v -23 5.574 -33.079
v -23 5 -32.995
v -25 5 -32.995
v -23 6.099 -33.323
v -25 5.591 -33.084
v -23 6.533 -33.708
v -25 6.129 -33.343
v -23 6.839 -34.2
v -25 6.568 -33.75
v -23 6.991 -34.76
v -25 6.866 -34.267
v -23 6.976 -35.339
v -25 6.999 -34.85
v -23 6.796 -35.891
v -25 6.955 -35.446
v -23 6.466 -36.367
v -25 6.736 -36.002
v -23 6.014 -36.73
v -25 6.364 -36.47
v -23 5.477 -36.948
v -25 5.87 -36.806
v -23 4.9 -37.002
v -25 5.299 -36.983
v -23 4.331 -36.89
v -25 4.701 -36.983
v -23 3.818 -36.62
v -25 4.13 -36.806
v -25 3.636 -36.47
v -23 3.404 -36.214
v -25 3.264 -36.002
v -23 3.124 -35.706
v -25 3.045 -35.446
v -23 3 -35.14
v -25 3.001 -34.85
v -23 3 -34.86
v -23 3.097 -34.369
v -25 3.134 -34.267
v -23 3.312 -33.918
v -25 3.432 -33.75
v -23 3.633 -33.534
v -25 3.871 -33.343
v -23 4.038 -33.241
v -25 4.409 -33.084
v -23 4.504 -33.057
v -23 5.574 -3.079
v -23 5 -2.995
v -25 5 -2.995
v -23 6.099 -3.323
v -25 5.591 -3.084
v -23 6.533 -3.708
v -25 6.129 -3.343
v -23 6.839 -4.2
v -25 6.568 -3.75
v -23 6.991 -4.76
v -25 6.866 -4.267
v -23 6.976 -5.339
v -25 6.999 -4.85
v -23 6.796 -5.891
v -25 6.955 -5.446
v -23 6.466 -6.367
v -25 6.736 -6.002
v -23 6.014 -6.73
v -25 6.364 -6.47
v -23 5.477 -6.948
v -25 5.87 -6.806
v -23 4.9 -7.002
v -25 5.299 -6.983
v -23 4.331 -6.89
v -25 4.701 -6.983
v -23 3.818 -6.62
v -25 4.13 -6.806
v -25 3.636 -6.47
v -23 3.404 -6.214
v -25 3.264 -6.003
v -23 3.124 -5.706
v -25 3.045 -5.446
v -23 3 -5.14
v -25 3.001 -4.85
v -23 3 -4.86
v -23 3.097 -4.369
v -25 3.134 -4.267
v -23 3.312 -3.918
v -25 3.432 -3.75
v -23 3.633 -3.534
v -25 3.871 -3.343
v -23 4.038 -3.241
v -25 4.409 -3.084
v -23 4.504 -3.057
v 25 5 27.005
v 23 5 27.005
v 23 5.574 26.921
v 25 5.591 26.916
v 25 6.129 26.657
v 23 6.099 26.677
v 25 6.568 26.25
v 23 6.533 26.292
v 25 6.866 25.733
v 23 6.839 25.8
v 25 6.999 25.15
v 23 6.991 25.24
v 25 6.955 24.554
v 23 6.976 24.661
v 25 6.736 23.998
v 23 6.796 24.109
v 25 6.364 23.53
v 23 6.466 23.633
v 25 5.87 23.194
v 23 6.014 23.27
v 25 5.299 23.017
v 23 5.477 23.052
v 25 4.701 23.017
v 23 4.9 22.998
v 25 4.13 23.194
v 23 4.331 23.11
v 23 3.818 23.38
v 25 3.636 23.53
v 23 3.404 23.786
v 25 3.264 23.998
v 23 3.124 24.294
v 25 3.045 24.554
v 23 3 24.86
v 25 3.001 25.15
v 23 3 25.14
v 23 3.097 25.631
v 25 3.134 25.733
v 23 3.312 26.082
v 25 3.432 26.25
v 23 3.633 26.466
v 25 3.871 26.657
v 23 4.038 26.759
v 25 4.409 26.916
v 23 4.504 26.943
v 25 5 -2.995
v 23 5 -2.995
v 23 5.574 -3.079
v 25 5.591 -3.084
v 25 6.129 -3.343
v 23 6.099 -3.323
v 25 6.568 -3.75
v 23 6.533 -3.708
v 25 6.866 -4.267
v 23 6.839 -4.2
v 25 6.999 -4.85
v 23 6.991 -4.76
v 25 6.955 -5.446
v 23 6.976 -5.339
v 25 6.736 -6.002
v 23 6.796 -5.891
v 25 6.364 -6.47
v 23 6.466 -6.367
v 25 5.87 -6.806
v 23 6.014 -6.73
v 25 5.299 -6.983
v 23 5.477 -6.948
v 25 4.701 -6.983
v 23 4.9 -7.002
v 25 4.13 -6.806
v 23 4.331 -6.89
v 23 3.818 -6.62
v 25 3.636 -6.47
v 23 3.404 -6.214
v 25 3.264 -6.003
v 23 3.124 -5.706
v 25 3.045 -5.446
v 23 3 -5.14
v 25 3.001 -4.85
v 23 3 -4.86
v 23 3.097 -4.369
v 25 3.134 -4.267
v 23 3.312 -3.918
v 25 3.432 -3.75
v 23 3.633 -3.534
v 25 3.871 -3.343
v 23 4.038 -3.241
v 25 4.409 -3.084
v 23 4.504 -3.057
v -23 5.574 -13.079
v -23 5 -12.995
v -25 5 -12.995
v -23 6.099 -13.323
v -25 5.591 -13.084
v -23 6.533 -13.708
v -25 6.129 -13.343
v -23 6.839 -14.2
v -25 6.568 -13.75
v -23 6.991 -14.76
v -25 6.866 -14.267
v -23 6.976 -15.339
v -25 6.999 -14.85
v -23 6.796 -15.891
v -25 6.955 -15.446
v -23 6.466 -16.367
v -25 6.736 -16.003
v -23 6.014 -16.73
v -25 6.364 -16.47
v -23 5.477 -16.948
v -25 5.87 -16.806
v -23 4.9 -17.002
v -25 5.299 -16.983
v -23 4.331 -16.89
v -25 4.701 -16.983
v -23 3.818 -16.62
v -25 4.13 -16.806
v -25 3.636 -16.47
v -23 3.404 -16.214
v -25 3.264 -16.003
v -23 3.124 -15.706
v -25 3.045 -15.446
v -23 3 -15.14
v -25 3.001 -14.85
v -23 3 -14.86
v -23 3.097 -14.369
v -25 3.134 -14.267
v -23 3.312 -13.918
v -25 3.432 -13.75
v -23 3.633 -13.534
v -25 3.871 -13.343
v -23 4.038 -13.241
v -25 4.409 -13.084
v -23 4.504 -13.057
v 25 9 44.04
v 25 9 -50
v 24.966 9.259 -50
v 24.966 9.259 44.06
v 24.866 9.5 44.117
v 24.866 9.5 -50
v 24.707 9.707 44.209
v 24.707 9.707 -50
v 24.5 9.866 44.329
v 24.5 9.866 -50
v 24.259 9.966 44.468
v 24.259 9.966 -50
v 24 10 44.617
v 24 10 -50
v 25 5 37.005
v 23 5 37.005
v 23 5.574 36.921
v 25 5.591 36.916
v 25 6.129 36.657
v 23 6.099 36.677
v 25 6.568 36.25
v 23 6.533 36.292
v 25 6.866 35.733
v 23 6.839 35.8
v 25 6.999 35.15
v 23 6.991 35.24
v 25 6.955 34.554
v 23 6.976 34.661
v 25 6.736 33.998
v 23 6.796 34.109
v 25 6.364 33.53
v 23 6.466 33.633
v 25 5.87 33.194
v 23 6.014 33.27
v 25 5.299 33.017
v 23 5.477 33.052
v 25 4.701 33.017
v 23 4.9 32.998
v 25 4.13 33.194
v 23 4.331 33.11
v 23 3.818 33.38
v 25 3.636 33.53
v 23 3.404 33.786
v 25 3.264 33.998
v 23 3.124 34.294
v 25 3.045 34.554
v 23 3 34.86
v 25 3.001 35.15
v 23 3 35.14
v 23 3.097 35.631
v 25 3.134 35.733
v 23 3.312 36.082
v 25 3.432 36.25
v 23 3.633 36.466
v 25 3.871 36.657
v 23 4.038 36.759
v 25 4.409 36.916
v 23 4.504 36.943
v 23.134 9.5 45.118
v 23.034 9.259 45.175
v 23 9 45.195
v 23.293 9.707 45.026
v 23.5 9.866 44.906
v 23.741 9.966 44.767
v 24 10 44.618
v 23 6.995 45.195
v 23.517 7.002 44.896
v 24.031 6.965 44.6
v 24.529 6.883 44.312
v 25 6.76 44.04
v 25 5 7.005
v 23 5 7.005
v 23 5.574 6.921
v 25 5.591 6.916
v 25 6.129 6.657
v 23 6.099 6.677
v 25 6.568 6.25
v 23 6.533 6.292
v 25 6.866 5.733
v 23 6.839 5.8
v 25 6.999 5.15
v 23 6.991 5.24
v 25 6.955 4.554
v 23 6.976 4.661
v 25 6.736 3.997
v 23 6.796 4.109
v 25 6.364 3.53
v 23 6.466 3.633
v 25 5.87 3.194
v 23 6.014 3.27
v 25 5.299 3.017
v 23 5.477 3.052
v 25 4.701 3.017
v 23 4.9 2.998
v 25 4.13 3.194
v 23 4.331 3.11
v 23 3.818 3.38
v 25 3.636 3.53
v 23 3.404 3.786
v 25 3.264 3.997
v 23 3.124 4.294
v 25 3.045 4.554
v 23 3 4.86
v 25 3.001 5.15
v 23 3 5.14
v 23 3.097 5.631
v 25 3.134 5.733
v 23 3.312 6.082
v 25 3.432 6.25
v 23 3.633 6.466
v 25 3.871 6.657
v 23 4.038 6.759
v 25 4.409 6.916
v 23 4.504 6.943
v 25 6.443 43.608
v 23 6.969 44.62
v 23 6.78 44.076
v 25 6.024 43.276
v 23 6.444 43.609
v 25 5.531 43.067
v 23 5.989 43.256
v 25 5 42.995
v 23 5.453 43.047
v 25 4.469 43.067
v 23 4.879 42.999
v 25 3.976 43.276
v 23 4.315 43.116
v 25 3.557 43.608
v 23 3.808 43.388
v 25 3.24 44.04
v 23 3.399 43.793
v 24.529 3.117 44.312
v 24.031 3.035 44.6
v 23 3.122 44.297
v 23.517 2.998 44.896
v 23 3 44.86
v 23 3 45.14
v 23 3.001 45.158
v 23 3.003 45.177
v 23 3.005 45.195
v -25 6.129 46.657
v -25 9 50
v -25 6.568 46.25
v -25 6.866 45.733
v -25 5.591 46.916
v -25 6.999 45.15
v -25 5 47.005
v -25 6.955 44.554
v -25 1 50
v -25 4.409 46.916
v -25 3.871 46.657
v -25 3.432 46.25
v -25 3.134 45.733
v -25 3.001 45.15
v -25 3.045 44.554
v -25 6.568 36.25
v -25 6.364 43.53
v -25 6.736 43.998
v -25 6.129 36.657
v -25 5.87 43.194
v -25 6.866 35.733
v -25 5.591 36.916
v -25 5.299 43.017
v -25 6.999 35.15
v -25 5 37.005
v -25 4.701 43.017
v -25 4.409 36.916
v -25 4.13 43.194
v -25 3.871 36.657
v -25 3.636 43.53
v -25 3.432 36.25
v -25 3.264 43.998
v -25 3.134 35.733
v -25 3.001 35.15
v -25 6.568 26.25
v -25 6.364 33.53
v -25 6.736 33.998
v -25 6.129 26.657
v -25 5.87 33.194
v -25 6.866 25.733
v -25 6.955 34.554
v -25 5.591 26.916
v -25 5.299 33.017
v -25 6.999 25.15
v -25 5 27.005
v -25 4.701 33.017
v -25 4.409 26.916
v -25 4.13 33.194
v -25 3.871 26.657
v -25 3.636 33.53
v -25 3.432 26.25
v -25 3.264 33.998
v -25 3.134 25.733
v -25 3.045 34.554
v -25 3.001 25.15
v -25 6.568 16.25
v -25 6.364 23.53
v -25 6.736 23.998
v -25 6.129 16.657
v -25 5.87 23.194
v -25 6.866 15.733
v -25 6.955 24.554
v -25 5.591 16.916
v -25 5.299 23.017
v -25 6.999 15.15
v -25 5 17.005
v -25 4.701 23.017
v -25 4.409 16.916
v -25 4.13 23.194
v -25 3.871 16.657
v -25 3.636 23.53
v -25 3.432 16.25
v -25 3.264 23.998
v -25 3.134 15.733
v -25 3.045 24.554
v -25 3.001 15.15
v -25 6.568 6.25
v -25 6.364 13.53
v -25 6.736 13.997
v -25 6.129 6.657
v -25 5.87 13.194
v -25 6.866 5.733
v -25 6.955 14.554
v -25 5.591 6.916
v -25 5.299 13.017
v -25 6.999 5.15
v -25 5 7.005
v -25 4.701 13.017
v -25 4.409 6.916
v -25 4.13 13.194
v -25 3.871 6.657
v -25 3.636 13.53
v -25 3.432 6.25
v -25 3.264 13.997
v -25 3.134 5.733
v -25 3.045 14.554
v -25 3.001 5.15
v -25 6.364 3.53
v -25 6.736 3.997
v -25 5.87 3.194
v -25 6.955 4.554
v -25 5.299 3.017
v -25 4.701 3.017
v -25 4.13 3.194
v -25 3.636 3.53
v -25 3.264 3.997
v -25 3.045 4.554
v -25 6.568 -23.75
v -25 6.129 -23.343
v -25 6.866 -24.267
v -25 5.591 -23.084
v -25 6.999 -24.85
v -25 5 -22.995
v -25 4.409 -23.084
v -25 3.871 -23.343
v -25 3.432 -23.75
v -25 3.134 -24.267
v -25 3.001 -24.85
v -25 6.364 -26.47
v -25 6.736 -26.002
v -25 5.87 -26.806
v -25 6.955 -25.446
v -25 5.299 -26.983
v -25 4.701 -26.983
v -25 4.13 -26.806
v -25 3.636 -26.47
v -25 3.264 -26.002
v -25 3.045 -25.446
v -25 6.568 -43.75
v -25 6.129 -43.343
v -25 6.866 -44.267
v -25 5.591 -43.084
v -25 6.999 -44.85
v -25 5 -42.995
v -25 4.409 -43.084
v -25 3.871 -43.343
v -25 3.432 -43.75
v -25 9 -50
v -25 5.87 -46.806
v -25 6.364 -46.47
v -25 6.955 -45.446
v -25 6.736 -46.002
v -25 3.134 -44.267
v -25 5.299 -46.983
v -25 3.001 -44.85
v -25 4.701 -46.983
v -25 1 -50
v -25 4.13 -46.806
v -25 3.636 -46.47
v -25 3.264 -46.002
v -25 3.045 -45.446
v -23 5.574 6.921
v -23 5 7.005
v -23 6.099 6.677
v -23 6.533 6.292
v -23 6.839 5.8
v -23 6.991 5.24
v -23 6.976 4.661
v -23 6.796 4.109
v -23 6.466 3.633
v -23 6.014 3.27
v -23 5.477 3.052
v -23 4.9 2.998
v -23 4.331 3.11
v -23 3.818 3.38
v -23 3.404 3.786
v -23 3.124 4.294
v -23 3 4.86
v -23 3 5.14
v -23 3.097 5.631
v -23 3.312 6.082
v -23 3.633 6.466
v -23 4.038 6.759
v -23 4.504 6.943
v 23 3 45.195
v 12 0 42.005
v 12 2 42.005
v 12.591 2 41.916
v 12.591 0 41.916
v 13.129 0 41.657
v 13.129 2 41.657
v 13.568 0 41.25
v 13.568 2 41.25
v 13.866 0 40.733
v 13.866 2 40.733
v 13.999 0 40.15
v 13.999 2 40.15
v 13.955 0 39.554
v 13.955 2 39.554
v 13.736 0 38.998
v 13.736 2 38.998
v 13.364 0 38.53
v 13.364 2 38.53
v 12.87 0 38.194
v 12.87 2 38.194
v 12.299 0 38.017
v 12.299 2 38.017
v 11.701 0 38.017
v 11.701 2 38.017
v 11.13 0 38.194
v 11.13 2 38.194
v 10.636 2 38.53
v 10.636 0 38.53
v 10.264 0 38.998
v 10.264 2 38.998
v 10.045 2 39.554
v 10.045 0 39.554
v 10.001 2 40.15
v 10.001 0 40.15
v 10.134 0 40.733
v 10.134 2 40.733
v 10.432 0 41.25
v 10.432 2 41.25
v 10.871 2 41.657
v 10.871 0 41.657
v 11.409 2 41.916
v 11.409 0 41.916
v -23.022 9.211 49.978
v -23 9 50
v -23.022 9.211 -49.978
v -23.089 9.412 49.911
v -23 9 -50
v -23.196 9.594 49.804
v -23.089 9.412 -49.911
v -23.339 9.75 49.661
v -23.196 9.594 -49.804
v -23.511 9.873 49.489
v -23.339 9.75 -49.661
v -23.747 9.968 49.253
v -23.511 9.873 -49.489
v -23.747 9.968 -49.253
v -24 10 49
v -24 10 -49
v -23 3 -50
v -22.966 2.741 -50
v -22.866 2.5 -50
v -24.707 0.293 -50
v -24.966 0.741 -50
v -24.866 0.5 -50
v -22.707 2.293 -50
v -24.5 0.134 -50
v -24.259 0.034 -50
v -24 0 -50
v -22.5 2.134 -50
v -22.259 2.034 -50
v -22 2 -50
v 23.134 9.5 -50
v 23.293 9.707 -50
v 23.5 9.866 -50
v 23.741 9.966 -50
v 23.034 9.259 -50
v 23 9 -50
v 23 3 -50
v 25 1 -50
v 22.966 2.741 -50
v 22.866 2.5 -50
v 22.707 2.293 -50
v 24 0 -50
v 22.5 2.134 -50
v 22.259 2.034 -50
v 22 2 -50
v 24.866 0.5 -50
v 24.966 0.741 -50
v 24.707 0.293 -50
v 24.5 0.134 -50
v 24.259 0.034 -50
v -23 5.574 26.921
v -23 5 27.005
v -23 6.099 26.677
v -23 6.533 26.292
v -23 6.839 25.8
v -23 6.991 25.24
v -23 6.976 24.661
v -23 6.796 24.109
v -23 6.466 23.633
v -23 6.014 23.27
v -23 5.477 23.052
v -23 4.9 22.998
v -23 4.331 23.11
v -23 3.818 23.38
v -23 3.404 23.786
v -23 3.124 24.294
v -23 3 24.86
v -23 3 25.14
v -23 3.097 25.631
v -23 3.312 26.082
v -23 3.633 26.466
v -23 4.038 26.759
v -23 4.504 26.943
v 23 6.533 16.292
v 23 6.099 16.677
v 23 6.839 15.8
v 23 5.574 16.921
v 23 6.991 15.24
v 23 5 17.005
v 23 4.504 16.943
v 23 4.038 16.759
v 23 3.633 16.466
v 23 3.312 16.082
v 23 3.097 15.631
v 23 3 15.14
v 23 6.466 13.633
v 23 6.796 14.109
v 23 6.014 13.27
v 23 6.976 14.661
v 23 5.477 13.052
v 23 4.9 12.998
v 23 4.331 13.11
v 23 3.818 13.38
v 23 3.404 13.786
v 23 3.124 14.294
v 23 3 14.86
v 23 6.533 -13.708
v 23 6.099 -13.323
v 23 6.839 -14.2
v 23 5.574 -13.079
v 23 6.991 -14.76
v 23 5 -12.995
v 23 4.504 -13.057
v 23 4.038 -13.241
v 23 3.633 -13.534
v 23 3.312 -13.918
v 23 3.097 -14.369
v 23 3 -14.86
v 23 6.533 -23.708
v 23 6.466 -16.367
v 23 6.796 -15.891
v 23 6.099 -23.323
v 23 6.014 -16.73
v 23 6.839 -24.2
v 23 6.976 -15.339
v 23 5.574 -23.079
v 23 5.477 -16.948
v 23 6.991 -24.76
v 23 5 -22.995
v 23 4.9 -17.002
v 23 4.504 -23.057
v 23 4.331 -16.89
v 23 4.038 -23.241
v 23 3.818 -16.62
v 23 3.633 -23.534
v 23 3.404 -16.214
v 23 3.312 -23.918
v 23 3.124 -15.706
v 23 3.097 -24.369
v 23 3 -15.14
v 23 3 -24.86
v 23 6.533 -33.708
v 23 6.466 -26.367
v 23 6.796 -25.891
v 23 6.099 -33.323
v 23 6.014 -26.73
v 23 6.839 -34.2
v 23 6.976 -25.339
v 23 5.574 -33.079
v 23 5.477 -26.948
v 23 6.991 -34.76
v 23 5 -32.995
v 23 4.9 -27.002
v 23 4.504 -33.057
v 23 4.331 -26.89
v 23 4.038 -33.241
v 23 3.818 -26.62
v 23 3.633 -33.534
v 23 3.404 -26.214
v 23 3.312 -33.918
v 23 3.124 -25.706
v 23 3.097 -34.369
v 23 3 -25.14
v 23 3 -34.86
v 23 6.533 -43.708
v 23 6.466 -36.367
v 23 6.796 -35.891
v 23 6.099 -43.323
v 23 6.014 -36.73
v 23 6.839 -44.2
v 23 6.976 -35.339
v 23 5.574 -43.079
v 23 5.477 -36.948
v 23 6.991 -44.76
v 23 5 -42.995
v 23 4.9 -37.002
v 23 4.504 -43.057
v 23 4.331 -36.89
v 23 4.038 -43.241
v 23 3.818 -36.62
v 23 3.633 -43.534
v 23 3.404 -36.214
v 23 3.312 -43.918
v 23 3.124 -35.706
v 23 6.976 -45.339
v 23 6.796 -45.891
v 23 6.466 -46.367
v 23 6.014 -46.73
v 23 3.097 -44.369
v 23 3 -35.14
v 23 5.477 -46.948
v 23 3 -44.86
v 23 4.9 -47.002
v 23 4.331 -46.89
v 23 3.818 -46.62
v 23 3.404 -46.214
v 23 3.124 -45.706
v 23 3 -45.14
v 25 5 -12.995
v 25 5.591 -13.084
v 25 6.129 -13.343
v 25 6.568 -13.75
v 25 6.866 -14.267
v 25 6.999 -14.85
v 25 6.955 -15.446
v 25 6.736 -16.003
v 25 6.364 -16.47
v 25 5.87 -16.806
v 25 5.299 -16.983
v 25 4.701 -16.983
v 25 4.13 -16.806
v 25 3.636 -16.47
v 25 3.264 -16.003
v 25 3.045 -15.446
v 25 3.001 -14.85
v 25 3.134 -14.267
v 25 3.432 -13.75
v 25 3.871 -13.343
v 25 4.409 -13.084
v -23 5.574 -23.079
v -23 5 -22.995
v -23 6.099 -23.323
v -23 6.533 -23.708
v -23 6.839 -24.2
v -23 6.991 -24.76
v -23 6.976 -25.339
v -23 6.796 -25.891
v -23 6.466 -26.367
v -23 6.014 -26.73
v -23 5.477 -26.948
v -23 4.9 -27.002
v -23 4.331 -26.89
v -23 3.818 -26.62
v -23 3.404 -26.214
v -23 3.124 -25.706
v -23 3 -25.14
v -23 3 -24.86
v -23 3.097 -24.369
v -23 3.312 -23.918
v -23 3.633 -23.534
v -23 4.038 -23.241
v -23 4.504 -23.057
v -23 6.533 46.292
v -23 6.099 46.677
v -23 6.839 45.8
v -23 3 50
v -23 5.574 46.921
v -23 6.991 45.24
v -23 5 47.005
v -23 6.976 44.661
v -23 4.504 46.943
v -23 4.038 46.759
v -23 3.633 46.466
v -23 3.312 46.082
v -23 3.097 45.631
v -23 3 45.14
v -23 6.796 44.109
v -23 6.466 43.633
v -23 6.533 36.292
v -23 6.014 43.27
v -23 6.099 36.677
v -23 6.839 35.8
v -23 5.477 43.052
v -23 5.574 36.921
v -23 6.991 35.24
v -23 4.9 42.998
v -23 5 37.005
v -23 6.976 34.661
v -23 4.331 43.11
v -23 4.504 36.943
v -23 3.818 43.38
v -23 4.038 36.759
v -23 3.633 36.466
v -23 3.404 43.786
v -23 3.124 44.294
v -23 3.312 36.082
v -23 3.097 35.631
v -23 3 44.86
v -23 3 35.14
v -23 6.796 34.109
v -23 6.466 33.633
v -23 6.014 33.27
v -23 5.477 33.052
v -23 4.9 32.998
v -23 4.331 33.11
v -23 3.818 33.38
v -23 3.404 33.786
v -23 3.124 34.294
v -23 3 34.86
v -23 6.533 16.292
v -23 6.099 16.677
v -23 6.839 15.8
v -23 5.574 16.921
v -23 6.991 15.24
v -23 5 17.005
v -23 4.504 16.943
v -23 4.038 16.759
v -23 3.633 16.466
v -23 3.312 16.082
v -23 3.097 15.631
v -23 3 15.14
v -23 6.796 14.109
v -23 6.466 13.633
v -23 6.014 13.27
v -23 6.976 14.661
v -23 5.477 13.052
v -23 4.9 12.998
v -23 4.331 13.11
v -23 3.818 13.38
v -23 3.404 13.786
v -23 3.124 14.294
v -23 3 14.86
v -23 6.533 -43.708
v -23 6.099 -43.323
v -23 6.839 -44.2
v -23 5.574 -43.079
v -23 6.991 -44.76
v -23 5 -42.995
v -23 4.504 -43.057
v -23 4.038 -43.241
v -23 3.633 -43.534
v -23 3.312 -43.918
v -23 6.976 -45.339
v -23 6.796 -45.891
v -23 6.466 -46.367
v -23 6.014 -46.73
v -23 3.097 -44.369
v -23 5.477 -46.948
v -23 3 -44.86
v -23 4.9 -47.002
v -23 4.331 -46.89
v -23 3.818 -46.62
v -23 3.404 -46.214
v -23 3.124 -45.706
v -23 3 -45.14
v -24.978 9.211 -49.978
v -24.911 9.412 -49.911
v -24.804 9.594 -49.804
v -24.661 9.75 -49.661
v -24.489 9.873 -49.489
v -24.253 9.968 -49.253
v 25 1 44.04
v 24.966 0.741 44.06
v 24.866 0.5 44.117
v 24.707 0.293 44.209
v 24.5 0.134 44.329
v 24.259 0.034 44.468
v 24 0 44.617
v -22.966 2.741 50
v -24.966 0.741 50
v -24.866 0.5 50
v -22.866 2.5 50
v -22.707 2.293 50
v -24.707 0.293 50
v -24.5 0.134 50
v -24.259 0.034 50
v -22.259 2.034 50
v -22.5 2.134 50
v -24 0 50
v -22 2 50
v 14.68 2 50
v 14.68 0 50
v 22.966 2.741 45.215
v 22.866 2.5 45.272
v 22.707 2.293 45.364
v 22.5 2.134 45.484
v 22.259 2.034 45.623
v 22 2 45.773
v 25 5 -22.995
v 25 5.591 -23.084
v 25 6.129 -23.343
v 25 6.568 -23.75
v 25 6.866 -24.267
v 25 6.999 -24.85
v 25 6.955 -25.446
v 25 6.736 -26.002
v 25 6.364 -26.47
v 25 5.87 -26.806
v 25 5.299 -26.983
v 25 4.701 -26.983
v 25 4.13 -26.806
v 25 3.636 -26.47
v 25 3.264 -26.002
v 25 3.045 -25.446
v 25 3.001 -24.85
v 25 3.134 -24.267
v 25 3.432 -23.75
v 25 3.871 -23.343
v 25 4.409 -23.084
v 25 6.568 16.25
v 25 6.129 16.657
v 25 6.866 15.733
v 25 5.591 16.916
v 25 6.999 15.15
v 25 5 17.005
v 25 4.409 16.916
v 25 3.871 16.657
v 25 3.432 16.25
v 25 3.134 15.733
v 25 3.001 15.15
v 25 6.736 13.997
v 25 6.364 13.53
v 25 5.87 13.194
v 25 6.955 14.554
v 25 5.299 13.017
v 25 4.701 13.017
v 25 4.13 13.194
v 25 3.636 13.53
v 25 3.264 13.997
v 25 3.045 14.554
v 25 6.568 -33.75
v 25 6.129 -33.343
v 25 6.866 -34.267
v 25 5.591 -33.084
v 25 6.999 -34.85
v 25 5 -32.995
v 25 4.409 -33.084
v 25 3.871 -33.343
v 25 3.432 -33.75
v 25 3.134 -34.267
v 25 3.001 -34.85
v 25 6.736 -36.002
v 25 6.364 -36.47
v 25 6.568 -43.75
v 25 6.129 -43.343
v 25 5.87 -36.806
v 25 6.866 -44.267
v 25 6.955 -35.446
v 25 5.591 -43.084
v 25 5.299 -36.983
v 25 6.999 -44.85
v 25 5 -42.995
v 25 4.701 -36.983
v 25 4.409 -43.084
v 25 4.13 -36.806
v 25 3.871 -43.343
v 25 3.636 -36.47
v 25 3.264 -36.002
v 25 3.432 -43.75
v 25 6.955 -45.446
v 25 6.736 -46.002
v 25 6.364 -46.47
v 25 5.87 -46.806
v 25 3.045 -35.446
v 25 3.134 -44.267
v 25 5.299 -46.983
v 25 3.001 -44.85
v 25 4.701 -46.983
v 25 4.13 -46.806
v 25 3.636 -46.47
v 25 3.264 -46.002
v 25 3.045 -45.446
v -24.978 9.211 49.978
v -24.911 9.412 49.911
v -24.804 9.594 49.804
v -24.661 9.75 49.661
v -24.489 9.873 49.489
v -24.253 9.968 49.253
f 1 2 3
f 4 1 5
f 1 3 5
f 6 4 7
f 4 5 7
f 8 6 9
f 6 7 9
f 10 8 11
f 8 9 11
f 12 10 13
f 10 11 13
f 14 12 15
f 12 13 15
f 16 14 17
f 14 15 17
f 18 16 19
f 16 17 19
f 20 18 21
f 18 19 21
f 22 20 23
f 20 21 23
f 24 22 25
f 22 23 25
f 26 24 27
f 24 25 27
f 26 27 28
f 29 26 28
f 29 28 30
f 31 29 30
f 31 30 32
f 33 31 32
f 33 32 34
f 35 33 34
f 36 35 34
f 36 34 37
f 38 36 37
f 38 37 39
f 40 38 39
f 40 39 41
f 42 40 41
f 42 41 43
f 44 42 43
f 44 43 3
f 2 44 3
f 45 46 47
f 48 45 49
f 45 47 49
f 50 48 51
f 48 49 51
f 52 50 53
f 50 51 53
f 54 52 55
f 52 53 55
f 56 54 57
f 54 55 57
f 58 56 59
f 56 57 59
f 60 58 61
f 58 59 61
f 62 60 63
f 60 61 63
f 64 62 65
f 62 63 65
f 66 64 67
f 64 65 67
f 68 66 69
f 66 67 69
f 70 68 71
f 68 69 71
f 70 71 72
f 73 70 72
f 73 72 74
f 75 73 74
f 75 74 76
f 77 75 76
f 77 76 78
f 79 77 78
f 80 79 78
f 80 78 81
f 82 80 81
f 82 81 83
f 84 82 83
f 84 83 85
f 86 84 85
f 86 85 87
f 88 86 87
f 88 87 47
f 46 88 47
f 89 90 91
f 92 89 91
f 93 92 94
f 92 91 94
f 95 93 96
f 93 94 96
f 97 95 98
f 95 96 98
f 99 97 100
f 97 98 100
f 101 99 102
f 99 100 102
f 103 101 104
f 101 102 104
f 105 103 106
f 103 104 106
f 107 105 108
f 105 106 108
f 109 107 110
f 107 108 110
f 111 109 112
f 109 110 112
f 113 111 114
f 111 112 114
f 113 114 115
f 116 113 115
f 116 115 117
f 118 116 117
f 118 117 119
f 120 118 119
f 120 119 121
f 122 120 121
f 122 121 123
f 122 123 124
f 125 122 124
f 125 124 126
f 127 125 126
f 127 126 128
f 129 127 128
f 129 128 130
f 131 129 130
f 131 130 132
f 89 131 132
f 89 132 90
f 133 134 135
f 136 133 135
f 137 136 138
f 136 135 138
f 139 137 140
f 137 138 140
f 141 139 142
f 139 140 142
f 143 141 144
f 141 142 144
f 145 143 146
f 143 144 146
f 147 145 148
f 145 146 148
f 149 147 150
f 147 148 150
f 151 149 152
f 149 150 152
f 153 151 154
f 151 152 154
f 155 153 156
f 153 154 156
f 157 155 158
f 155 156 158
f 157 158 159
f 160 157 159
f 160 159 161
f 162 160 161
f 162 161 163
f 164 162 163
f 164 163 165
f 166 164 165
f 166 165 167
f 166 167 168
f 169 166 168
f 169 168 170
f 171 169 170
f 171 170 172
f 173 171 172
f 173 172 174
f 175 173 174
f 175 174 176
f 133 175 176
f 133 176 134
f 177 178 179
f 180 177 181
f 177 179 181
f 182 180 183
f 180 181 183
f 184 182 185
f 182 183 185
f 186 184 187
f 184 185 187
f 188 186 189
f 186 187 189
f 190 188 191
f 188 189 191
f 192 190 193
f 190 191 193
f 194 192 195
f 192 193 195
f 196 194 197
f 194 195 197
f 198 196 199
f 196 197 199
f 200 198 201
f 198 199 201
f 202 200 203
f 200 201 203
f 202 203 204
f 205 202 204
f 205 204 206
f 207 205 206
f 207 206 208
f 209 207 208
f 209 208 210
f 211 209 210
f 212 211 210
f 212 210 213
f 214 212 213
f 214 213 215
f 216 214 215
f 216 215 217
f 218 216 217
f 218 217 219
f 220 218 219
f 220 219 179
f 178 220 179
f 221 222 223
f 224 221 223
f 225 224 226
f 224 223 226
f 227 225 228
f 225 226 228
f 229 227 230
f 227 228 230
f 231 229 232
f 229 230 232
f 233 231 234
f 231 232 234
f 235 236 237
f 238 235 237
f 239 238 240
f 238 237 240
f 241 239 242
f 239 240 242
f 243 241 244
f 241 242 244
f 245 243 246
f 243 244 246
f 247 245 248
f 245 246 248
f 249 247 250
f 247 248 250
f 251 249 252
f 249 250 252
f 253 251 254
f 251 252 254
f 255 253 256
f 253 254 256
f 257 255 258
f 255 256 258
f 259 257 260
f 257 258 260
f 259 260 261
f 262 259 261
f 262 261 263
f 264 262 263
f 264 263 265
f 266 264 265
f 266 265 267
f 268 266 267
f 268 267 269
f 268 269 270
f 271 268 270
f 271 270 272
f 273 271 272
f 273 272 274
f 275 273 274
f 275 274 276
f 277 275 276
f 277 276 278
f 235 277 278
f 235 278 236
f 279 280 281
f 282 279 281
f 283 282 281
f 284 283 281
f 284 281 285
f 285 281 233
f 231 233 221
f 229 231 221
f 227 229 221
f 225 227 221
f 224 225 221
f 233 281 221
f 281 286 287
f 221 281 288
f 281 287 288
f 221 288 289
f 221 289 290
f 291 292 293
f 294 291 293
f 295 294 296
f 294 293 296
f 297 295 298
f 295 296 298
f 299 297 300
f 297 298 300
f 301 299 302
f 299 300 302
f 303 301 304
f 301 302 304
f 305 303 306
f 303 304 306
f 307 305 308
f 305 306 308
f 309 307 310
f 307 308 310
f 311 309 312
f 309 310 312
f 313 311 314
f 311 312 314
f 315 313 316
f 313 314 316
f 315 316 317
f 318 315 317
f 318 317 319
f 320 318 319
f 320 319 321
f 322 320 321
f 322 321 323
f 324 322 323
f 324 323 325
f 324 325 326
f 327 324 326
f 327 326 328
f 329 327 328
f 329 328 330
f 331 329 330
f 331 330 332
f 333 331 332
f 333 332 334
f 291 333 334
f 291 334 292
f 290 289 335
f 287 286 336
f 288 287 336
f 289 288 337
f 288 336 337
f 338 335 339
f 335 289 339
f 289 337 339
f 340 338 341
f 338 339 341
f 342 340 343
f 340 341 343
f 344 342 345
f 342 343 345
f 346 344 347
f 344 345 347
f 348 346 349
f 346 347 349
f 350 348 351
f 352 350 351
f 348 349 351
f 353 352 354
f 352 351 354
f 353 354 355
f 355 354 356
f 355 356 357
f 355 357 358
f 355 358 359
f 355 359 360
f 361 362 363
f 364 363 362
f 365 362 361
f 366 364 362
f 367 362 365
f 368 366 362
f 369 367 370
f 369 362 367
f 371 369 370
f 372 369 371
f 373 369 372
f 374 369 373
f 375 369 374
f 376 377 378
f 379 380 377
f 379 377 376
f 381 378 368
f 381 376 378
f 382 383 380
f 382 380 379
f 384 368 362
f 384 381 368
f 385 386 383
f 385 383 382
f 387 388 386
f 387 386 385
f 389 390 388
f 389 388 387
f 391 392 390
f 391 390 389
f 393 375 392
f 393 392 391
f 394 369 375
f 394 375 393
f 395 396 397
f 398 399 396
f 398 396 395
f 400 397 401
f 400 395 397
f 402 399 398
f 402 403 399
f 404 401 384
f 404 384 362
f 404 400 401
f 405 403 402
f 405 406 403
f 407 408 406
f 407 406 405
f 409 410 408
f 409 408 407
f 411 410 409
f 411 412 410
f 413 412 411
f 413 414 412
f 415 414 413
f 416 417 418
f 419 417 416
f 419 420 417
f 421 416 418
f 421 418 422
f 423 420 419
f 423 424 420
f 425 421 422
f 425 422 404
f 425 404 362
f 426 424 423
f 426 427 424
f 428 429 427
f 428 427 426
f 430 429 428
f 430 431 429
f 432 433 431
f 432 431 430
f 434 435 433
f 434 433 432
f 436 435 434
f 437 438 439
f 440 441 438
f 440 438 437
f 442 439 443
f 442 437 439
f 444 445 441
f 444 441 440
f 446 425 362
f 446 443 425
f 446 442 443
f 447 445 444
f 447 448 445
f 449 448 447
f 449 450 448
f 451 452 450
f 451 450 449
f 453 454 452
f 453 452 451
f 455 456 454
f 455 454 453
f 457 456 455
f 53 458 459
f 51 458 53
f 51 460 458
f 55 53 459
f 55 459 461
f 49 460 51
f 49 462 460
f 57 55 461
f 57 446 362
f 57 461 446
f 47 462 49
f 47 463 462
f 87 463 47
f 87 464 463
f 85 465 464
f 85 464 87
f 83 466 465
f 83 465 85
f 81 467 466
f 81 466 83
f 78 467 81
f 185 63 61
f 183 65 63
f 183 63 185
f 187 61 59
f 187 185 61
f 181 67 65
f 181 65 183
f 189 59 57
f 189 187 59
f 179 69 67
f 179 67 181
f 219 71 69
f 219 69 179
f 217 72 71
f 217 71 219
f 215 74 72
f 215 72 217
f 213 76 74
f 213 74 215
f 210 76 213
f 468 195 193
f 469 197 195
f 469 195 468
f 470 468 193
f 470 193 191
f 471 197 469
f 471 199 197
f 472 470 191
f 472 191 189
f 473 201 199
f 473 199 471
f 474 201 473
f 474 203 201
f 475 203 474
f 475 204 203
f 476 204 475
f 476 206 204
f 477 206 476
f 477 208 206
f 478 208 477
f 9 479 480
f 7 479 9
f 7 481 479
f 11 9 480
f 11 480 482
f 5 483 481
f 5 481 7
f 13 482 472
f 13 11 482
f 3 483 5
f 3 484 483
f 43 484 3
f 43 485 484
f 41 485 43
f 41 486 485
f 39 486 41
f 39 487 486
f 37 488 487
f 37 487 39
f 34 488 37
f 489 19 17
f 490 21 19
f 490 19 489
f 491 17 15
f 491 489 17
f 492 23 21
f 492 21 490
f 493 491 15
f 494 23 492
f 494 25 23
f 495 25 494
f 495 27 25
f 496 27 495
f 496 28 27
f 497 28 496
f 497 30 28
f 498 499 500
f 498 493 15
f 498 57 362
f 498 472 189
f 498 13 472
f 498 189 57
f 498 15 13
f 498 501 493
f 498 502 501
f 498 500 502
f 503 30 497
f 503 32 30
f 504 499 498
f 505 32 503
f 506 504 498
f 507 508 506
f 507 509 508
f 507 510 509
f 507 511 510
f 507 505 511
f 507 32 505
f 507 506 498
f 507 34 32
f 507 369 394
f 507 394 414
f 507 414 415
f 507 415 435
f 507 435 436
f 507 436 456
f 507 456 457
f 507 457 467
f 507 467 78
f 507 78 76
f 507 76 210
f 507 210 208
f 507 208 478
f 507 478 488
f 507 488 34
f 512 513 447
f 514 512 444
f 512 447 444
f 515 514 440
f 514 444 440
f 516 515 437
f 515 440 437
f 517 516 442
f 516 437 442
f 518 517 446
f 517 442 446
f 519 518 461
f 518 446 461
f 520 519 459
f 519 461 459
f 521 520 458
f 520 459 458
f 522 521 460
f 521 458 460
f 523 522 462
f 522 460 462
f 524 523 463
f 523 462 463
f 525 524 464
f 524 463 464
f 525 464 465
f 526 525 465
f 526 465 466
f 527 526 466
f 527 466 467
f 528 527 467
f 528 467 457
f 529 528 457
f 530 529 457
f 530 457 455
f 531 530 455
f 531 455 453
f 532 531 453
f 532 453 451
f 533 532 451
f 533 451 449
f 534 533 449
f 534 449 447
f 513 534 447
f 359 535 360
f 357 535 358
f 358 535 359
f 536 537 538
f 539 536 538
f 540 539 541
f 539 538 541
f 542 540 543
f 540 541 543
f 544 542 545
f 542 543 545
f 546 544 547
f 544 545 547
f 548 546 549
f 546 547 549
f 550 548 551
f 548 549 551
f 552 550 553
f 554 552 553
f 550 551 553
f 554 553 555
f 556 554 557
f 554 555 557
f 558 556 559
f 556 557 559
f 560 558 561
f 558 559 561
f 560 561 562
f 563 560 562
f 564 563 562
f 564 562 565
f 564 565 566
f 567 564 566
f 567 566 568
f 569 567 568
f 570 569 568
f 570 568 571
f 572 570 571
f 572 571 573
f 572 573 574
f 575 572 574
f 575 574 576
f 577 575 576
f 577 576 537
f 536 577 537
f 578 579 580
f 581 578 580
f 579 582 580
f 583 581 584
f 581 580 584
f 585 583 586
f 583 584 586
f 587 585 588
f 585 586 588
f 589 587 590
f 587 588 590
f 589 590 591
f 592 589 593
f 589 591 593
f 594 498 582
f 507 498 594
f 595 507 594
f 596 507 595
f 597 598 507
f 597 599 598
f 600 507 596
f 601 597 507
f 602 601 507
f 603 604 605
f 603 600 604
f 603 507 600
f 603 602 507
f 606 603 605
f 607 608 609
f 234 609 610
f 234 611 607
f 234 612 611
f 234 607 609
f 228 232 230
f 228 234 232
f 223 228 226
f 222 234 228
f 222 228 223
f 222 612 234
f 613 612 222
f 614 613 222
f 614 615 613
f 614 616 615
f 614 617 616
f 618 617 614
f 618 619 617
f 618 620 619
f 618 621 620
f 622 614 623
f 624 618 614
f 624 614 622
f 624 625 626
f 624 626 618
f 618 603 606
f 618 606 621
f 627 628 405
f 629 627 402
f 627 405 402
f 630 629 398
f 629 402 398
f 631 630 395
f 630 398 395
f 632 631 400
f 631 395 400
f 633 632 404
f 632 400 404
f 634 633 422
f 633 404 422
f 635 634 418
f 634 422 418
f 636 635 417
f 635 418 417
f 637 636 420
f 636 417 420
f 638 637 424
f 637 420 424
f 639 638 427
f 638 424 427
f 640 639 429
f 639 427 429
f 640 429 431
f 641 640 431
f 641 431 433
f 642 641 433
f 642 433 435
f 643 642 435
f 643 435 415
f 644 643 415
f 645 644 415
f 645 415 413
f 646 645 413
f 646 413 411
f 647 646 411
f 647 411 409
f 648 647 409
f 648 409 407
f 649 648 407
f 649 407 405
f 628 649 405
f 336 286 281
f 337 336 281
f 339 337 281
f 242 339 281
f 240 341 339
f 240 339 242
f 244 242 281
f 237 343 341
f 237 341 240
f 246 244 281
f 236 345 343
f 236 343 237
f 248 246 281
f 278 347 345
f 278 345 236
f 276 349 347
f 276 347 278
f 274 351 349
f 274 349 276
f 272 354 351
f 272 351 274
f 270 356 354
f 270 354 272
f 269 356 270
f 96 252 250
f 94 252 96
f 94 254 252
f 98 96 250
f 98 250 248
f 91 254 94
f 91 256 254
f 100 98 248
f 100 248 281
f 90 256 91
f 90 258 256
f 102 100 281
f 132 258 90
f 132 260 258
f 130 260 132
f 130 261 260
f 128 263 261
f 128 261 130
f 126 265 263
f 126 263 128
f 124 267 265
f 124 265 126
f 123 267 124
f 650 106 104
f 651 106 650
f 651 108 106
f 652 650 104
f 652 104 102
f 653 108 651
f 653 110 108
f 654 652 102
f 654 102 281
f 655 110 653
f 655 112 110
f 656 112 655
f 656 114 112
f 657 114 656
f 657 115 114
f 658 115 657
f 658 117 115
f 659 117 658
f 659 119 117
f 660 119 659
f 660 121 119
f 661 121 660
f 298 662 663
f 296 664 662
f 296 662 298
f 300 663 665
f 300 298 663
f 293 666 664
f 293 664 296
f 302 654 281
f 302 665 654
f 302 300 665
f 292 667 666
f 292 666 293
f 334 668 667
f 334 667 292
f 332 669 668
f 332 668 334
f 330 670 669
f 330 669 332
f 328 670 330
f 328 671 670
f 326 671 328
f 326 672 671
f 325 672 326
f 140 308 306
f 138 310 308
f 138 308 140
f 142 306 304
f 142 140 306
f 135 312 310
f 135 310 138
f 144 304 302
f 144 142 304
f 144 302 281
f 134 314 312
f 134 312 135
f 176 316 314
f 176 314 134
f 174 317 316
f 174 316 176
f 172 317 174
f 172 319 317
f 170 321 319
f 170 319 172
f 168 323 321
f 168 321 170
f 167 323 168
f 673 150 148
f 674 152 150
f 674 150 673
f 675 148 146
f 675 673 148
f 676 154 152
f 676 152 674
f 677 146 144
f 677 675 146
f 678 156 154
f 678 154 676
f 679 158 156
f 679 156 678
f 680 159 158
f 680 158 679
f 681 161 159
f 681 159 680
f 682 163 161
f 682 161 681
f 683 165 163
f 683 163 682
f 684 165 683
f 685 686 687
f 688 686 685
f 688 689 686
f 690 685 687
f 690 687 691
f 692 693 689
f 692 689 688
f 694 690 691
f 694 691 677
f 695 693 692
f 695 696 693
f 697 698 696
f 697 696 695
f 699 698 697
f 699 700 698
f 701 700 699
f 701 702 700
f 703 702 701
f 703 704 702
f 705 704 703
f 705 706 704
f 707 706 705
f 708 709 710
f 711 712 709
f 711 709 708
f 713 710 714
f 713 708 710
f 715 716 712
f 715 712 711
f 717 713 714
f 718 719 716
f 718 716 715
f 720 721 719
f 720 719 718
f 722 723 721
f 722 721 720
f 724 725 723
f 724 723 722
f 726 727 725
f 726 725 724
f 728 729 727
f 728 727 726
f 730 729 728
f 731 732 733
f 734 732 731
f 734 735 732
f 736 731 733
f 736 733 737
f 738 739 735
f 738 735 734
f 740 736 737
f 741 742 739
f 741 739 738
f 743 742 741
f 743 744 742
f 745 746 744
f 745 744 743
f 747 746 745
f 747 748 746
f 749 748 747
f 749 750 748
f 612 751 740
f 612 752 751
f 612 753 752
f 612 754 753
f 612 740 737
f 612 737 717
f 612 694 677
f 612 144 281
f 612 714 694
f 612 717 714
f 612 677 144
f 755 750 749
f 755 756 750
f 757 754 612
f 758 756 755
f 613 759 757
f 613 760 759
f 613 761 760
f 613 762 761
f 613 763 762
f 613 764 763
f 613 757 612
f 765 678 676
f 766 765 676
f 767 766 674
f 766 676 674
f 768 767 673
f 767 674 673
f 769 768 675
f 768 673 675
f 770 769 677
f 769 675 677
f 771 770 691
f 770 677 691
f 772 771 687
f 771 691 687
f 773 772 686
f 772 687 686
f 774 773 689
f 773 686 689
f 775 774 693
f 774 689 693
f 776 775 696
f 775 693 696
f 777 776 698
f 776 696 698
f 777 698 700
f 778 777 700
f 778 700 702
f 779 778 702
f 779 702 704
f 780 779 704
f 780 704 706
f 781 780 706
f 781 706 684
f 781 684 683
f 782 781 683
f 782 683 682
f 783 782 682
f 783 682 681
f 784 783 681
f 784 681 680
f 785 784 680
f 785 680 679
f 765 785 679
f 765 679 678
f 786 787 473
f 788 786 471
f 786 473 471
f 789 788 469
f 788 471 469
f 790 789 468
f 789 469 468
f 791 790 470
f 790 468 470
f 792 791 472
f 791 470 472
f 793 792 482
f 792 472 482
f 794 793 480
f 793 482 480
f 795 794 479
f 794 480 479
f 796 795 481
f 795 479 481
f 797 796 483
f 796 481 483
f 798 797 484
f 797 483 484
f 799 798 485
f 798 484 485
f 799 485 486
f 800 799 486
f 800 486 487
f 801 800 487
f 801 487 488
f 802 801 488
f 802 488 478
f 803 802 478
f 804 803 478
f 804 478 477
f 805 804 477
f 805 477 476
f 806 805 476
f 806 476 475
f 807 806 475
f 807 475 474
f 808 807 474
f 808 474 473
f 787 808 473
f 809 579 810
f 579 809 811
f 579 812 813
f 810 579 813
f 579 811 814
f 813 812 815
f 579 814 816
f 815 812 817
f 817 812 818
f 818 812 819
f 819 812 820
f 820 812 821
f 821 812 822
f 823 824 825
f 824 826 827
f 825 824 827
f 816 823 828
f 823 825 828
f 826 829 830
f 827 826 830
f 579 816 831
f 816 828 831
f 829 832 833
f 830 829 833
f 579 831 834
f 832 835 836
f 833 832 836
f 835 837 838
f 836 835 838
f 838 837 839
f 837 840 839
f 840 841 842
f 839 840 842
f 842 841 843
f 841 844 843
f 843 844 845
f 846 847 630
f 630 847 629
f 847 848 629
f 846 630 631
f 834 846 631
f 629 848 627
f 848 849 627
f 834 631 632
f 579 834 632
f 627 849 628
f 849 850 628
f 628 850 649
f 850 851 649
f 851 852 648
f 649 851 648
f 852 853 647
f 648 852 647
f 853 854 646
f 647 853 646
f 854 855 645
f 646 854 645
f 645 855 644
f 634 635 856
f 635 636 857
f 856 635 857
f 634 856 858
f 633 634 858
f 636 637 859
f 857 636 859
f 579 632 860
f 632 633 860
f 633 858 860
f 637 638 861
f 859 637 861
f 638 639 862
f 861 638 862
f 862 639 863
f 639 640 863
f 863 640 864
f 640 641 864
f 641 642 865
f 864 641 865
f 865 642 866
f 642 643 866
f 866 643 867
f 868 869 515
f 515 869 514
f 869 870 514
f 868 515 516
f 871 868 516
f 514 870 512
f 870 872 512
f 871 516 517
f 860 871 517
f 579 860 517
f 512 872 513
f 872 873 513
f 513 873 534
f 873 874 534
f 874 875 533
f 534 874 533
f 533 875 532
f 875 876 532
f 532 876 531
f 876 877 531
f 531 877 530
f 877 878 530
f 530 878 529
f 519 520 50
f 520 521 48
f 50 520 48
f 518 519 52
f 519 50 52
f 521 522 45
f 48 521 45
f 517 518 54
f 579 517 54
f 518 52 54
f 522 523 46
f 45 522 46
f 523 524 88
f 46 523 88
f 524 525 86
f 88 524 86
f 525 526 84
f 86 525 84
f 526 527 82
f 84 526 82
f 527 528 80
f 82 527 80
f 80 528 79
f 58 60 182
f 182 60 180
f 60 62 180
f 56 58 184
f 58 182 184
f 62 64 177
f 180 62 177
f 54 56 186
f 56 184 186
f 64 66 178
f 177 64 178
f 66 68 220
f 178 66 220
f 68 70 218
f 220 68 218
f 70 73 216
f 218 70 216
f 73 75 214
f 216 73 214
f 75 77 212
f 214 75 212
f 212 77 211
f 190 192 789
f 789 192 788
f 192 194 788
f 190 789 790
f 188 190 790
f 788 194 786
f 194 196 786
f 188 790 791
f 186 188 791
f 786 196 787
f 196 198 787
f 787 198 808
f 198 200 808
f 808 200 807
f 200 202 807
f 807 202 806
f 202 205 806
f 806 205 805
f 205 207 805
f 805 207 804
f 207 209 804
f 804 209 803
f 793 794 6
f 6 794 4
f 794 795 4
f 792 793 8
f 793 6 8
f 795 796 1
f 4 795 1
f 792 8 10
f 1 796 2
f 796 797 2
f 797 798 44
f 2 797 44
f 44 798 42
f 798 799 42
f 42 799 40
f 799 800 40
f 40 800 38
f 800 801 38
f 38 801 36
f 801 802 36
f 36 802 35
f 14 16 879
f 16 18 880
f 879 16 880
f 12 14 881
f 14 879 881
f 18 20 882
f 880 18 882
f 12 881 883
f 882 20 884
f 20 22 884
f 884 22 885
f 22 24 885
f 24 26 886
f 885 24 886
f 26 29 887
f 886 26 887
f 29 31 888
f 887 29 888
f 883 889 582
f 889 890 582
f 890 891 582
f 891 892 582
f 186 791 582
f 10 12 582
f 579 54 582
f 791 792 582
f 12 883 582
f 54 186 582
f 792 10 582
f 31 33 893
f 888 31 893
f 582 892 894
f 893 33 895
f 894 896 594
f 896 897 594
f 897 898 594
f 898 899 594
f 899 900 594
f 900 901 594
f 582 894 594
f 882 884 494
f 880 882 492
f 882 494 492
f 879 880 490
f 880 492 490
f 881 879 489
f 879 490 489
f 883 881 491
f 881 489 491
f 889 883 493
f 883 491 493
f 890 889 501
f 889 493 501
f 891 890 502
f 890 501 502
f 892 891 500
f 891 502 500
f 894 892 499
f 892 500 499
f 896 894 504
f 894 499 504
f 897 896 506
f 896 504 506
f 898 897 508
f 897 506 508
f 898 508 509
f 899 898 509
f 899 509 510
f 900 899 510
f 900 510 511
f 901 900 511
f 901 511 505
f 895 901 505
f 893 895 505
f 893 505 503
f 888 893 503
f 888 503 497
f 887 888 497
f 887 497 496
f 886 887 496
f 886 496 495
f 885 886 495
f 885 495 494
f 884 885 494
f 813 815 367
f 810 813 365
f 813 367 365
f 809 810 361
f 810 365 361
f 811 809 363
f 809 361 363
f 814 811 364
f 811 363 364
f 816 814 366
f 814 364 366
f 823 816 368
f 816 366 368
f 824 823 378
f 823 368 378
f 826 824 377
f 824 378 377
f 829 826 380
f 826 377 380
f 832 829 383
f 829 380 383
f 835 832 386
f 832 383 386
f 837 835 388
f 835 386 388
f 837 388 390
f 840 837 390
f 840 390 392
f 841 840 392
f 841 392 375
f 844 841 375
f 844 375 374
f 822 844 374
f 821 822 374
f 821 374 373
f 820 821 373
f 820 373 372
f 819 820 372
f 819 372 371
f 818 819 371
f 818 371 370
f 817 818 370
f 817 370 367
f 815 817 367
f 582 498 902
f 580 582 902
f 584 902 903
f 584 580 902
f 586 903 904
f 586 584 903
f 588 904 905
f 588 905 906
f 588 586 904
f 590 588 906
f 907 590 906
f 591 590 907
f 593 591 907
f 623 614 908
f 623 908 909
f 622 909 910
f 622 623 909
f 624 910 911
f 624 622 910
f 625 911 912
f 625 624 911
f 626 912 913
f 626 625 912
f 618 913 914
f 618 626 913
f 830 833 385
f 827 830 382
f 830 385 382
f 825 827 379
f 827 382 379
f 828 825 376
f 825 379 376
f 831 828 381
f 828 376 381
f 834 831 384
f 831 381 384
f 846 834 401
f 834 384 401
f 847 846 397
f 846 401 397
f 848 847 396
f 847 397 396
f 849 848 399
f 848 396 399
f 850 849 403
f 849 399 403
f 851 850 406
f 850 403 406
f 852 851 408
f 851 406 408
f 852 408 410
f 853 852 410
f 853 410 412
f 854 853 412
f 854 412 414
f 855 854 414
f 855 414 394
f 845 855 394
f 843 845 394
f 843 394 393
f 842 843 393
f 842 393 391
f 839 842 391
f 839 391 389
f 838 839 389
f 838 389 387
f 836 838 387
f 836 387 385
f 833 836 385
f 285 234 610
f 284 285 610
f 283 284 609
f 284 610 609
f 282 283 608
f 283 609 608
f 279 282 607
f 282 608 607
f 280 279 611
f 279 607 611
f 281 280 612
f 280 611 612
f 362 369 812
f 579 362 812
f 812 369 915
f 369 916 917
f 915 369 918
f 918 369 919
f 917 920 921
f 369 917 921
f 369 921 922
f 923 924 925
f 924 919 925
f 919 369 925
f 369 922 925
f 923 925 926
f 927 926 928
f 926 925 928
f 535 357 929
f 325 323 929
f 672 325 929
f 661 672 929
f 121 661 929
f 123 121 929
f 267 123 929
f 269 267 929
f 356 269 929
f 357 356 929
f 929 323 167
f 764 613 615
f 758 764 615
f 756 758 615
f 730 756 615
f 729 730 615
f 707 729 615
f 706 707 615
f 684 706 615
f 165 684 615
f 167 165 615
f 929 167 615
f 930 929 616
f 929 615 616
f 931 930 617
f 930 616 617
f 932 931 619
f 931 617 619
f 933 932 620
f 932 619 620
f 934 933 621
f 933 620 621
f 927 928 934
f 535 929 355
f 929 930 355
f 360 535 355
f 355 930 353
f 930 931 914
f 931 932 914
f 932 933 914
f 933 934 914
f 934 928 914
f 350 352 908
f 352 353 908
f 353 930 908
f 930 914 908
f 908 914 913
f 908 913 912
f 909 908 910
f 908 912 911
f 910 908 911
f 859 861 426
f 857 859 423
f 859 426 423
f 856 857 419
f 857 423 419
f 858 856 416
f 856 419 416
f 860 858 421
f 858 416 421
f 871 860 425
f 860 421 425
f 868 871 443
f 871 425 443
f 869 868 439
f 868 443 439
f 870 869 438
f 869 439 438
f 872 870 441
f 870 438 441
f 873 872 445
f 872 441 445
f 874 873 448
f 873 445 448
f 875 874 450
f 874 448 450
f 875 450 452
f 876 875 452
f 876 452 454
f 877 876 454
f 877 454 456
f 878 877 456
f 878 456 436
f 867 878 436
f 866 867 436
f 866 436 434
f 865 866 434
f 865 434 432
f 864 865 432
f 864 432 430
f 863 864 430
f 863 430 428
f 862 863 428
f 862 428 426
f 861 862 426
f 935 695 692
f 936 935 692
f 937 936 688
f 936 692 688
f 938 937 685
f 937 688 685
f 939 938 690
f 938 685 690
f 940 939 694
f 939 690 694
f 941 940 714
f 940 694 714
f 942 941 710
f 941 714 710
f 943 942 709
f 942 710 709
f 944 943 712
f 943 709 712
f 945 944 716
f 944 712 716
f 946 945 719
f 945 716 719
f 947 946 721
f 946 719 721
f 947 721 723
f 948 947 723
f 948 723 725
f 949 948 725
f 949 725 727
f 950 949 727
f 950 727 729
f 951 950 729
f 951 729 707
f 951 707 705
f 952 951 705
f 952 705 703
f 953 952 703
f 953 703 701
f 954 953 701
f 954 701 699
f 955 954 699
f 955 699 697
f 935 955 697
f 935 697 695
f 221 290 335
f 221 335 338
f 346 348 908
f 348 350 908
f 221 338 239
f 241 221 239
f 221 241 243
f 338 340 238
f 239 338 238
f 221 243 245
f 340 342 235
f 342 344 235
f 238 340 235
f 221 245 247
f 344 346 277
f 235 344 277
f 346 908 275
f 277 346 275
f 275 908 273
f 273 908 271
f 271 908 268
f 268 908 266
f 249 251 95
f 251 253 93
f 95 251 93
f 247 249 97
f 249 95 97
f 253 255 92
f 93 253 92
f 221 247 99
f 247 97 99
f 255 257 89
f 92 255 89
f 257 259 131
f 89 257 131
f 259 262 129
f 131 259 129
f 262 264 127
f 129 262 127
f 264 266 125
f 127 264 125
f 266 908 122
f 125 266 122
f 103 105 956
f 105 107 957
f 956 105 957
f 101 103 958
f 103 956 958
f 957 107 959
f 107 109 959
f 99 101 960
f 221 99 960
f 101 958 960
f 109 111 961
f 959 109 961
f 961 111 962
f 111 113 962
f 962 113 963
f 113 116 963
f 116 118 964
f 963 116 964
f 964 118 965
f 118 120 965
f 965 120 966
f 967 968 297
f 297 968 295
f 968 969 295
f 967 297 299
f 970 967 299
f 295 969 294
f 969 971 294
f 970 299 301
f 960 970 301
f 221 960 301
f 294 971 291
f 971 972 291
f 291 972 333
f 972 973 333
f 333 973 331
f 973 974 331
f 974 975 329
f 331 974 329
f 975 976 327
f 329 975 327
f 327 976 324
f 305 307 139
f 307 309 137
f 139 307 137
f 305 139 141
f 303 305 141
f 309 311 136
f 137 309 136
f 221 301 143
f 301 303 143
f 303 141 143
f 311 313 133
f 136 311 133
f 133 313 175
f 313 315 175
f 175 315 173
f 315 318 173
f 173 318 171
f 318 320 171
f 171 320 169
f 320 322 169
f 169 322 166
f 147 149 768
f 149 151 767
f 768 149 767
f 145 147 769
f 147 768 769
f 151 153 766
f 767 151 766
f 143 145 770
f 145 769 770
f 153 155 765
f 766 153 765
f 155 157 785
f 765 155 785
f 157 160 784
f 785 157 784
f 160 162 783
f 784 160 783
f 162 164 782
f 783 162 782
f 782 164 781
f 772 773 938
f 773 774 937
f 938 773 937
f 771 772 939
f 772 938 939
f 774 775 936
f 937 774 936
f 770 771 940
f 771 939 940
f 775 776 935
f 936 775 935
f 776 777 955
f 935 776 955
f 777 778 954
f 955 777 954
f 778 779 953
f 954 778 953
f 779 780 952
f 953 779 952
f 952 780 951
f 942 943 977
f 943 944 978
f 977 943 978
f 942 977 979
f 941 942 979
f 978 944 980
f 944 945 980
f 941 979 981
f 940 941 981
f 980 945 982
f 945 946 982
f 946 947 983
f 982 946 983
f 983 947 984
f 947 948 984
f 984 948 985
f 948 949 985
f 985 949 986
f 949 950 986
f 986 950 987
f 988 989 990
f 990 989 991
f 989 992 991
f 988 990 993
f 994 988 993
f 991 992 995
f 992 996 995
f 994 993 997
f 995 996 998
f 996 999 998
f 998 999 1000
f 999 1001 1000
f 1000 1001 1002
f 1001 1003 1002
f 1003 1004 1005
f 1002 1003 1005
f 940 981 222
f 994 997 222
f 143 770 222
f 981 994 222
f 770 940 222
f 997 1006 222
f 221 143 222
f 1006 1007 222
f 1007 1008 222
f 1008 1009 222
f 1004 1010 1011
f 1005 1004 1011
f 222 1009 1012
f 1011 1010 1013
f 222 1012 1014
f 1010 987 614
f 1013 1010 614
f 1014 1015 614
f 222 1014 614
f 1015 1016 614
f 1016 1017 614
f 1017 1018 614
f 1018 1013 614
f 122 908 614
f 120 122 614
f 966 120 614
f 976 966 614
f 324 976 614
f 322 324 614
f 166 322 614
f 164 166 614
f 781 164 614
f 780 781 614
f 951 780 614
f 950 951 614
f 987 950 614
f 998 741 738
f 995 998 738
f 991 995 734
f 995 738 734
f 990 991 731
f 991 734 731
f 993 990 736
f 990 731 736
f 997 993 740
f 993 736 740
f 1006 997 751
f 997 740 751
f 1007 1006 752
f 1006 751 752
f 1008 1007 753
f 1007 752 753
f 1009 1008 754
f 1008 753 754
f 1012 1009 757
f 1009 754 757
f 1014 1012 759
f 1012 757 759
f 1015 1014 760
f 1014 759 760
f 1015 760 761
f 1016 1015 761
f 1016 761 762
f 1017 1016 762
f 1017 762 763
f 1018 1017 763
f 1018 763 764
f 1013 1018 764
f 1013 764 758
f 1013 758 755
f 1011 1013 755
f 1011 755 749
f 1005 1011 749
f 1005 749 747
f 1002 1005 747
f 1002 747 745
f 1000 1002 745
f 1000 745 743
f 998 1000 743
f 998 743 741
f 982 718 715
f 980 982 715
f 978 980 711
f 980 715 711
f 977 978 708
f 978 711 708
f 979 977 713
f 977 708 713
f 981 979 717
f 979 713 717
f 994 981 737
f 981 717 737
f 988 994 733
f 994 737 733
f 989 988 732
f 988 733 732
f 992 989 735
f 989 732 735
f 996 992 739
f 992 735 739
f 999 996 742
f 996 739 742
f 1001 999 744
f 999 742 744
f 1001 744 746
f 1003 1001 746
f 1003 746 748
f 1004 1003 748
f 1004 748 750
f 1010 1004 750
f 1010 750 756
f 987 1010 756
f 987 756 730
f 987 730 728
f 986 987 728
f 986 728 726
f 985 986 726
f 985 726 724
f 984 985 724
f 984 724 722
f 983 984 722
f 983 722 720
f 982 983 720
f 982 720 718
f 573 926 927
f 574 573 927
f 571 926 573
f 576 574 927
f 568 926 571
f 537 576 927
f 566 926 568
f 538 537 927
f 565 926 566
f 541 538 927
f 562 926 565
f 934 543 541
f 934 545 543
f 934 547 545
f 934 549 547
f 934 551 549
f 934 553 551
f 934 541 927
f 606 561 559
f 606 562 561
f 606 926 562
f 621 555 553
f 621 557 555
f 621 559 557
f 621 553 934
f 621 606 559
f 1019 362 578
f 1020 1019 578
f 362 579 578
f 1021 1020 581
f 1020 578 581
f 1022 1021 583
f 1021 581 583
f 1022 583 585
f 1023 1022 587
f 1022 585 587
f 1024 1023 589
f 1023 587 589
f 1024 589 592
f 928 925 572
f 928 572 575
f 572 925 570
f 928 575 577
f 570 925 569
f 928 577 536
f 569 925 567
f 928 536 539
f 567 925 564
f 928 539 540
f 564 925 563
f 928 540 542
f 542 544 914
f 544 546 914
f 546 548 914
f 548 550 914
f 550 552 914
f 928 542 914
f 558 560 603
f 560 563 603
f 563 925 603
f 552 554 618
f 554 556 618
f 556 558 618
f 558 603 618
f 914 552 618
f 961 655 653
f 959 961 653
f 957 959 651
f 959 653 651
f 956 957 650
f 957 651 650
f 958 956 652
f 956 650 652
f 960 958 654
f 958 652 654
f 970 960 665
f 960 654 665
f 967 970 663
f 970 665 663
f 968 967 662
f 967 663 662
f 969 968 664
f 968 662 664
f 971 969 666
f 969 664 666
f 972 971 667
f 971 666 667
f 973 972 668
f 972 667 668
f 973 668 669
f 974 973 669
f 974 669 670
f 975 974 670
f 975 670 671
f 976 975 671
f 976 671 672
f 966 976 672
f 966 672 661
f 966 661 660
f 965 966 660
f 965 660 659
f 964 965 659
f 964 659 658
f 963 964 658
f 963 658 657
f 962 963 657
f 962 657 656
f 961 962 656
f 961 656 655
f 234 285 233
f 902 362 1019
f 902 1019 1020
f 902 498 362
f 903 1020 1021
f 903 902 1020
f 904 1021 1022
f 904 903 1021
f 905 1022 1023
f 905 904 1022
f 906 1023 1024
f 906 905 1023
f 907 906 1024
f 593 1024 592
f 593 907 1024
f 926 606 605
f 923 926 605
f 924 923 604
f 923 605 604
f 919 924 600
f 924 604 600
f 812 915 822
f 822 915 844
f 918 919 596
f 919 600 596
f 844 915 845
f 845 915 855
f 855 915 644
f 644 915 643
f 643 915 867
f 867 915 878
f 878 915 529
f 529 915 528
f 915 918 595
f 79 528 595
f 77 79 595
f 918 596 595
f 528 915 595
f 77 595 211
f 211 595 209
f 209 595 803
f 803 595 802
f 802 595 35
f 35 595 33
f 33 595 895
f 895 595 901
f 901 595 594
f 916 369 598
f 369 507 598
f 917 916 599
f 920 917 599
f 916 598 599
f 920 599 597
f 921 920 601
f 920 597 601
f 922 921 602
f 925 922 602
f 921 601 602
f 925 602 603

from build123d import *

# Parameters (mm, degrees)
SKETCH1_W           = 50
SKETCH1_H           = 100
BOSS_EXTRUDE1_DEPTH = 2
SKETCH2_W           = 2
SKETCH2_H           = 100
BOSS_EXTRUDE2_DEPTH = 8
FILLET1_R           = 1
SKETCH3_R           = 2.005
CUT_EXTRUDE1_DEPTH  = 72.414284285
SKETCH4_R           = 2.005
CUT_EXTRUDE2_DEPTH  = 10
CUT_EXTRUDE3_DEPTH  = 57.78908359


with BuildPart() as part:
    # Sketch1 → Boss-Extrude1 (new body)
    with BuildSketch(Plane(origin=(0, 0, 0), x_dir=(1, 0, 0), z_dir=(0, 1, 0))):
        Rectangle(SKETCH1_W, SKETCH1_H)
    extrude(amount=BOSS_EXTRUDE1_DEPTH)

    # Sketch2 → Boss-Extrude2 (add)
    with BuildSketch(Plane(origin=(0, 2, 0), x_dir=(1, 0, 0), z_dir=(0, 1, 0))):
        with Locations((-24, 0)):
            Rectangle(SKETCH2_W, SKETCH2_H)
        with Locations((24, 0)):
            Rectangle(SKETCH2_W, SKETCH2_H)
    extrude(amount=BOSS_EXTRUDE2_DEPTH)

    # Fillet1
    fillet1_edges = [part.edges().sort_by_distance(p)[0] for p in [
        (-24, 10, -50),
        (-23, 10, 0),
        (-24, 10, 50),
        (-25, 10, 0),
        (25, 0, 0),
        (-25, 0, 0),
        (25, 10, 0),
        (23, 10, 0),
        (-23, 2, 0),
        (23, 2, 0),
    ]]
    fillet(fillet1_edges, radius=FILLET1_R - 0.0001)  # a hair under: the kernel refuses the full size

    # Sketch3 → Cut-Extrude1 (cut, through all)
    with BuildSketch(Plane.ZY.offset(25)):
        with Locations((-45, 5)):
            Circle(SKETCH3_R)
        with Locations((-35, 5)):
            Circle(SKETCH3_R)
        with Locations((-25, 5)):
            Circle(SKETCH3_R)
        with Locations((-15, 5)):
            Circle(SKETCH3_R)
        with Locations((-5, 5)):
            Circle(SKETCH3_R)
        with Locations((5, 5)):
            Circle(SKETCH3_R)
        with Locations((15, 5)):
            Circle(SKETCH3_R)
        with Locations((25, 5)):
            Circle(SKETCH3_R)
        with Locations((35, 5)):
            Circle(SKETCH3_R)
        with Locations((45, 5)):
            Circle(SKETCH3_R)
    extrude(amount=-CUT_EXTRUDE1_DEPTH, mode=Mode.SUBTRACT)

    # Sketch4 → Cut-Extrude2 (cut)
    with BuildSketch(Plane(origin=(0, 2, 0), x_dir=(1, 0, 0), z_dir=(0, 1, 0))):
        with Locations(Location((12, -40, 0), (0, 0, 270))):
            Circle(SKETCH4_R)
    extrude(amount=-CUT_EXTRUDE2_DEPTH, mode=Mode.SUBTRACT)

    # Sketch5 → Cut-Extrude3 (cut, through all)
    with BuildSketch(Plane.XZ):
        Polygon((25, 50), (14.68, 50), (25, 44.04), align=None)
    extrude(amount=-CUT_EXTRUDE3_DEPTH, mode=Mode.SUBTRACT)


solid = part.part
